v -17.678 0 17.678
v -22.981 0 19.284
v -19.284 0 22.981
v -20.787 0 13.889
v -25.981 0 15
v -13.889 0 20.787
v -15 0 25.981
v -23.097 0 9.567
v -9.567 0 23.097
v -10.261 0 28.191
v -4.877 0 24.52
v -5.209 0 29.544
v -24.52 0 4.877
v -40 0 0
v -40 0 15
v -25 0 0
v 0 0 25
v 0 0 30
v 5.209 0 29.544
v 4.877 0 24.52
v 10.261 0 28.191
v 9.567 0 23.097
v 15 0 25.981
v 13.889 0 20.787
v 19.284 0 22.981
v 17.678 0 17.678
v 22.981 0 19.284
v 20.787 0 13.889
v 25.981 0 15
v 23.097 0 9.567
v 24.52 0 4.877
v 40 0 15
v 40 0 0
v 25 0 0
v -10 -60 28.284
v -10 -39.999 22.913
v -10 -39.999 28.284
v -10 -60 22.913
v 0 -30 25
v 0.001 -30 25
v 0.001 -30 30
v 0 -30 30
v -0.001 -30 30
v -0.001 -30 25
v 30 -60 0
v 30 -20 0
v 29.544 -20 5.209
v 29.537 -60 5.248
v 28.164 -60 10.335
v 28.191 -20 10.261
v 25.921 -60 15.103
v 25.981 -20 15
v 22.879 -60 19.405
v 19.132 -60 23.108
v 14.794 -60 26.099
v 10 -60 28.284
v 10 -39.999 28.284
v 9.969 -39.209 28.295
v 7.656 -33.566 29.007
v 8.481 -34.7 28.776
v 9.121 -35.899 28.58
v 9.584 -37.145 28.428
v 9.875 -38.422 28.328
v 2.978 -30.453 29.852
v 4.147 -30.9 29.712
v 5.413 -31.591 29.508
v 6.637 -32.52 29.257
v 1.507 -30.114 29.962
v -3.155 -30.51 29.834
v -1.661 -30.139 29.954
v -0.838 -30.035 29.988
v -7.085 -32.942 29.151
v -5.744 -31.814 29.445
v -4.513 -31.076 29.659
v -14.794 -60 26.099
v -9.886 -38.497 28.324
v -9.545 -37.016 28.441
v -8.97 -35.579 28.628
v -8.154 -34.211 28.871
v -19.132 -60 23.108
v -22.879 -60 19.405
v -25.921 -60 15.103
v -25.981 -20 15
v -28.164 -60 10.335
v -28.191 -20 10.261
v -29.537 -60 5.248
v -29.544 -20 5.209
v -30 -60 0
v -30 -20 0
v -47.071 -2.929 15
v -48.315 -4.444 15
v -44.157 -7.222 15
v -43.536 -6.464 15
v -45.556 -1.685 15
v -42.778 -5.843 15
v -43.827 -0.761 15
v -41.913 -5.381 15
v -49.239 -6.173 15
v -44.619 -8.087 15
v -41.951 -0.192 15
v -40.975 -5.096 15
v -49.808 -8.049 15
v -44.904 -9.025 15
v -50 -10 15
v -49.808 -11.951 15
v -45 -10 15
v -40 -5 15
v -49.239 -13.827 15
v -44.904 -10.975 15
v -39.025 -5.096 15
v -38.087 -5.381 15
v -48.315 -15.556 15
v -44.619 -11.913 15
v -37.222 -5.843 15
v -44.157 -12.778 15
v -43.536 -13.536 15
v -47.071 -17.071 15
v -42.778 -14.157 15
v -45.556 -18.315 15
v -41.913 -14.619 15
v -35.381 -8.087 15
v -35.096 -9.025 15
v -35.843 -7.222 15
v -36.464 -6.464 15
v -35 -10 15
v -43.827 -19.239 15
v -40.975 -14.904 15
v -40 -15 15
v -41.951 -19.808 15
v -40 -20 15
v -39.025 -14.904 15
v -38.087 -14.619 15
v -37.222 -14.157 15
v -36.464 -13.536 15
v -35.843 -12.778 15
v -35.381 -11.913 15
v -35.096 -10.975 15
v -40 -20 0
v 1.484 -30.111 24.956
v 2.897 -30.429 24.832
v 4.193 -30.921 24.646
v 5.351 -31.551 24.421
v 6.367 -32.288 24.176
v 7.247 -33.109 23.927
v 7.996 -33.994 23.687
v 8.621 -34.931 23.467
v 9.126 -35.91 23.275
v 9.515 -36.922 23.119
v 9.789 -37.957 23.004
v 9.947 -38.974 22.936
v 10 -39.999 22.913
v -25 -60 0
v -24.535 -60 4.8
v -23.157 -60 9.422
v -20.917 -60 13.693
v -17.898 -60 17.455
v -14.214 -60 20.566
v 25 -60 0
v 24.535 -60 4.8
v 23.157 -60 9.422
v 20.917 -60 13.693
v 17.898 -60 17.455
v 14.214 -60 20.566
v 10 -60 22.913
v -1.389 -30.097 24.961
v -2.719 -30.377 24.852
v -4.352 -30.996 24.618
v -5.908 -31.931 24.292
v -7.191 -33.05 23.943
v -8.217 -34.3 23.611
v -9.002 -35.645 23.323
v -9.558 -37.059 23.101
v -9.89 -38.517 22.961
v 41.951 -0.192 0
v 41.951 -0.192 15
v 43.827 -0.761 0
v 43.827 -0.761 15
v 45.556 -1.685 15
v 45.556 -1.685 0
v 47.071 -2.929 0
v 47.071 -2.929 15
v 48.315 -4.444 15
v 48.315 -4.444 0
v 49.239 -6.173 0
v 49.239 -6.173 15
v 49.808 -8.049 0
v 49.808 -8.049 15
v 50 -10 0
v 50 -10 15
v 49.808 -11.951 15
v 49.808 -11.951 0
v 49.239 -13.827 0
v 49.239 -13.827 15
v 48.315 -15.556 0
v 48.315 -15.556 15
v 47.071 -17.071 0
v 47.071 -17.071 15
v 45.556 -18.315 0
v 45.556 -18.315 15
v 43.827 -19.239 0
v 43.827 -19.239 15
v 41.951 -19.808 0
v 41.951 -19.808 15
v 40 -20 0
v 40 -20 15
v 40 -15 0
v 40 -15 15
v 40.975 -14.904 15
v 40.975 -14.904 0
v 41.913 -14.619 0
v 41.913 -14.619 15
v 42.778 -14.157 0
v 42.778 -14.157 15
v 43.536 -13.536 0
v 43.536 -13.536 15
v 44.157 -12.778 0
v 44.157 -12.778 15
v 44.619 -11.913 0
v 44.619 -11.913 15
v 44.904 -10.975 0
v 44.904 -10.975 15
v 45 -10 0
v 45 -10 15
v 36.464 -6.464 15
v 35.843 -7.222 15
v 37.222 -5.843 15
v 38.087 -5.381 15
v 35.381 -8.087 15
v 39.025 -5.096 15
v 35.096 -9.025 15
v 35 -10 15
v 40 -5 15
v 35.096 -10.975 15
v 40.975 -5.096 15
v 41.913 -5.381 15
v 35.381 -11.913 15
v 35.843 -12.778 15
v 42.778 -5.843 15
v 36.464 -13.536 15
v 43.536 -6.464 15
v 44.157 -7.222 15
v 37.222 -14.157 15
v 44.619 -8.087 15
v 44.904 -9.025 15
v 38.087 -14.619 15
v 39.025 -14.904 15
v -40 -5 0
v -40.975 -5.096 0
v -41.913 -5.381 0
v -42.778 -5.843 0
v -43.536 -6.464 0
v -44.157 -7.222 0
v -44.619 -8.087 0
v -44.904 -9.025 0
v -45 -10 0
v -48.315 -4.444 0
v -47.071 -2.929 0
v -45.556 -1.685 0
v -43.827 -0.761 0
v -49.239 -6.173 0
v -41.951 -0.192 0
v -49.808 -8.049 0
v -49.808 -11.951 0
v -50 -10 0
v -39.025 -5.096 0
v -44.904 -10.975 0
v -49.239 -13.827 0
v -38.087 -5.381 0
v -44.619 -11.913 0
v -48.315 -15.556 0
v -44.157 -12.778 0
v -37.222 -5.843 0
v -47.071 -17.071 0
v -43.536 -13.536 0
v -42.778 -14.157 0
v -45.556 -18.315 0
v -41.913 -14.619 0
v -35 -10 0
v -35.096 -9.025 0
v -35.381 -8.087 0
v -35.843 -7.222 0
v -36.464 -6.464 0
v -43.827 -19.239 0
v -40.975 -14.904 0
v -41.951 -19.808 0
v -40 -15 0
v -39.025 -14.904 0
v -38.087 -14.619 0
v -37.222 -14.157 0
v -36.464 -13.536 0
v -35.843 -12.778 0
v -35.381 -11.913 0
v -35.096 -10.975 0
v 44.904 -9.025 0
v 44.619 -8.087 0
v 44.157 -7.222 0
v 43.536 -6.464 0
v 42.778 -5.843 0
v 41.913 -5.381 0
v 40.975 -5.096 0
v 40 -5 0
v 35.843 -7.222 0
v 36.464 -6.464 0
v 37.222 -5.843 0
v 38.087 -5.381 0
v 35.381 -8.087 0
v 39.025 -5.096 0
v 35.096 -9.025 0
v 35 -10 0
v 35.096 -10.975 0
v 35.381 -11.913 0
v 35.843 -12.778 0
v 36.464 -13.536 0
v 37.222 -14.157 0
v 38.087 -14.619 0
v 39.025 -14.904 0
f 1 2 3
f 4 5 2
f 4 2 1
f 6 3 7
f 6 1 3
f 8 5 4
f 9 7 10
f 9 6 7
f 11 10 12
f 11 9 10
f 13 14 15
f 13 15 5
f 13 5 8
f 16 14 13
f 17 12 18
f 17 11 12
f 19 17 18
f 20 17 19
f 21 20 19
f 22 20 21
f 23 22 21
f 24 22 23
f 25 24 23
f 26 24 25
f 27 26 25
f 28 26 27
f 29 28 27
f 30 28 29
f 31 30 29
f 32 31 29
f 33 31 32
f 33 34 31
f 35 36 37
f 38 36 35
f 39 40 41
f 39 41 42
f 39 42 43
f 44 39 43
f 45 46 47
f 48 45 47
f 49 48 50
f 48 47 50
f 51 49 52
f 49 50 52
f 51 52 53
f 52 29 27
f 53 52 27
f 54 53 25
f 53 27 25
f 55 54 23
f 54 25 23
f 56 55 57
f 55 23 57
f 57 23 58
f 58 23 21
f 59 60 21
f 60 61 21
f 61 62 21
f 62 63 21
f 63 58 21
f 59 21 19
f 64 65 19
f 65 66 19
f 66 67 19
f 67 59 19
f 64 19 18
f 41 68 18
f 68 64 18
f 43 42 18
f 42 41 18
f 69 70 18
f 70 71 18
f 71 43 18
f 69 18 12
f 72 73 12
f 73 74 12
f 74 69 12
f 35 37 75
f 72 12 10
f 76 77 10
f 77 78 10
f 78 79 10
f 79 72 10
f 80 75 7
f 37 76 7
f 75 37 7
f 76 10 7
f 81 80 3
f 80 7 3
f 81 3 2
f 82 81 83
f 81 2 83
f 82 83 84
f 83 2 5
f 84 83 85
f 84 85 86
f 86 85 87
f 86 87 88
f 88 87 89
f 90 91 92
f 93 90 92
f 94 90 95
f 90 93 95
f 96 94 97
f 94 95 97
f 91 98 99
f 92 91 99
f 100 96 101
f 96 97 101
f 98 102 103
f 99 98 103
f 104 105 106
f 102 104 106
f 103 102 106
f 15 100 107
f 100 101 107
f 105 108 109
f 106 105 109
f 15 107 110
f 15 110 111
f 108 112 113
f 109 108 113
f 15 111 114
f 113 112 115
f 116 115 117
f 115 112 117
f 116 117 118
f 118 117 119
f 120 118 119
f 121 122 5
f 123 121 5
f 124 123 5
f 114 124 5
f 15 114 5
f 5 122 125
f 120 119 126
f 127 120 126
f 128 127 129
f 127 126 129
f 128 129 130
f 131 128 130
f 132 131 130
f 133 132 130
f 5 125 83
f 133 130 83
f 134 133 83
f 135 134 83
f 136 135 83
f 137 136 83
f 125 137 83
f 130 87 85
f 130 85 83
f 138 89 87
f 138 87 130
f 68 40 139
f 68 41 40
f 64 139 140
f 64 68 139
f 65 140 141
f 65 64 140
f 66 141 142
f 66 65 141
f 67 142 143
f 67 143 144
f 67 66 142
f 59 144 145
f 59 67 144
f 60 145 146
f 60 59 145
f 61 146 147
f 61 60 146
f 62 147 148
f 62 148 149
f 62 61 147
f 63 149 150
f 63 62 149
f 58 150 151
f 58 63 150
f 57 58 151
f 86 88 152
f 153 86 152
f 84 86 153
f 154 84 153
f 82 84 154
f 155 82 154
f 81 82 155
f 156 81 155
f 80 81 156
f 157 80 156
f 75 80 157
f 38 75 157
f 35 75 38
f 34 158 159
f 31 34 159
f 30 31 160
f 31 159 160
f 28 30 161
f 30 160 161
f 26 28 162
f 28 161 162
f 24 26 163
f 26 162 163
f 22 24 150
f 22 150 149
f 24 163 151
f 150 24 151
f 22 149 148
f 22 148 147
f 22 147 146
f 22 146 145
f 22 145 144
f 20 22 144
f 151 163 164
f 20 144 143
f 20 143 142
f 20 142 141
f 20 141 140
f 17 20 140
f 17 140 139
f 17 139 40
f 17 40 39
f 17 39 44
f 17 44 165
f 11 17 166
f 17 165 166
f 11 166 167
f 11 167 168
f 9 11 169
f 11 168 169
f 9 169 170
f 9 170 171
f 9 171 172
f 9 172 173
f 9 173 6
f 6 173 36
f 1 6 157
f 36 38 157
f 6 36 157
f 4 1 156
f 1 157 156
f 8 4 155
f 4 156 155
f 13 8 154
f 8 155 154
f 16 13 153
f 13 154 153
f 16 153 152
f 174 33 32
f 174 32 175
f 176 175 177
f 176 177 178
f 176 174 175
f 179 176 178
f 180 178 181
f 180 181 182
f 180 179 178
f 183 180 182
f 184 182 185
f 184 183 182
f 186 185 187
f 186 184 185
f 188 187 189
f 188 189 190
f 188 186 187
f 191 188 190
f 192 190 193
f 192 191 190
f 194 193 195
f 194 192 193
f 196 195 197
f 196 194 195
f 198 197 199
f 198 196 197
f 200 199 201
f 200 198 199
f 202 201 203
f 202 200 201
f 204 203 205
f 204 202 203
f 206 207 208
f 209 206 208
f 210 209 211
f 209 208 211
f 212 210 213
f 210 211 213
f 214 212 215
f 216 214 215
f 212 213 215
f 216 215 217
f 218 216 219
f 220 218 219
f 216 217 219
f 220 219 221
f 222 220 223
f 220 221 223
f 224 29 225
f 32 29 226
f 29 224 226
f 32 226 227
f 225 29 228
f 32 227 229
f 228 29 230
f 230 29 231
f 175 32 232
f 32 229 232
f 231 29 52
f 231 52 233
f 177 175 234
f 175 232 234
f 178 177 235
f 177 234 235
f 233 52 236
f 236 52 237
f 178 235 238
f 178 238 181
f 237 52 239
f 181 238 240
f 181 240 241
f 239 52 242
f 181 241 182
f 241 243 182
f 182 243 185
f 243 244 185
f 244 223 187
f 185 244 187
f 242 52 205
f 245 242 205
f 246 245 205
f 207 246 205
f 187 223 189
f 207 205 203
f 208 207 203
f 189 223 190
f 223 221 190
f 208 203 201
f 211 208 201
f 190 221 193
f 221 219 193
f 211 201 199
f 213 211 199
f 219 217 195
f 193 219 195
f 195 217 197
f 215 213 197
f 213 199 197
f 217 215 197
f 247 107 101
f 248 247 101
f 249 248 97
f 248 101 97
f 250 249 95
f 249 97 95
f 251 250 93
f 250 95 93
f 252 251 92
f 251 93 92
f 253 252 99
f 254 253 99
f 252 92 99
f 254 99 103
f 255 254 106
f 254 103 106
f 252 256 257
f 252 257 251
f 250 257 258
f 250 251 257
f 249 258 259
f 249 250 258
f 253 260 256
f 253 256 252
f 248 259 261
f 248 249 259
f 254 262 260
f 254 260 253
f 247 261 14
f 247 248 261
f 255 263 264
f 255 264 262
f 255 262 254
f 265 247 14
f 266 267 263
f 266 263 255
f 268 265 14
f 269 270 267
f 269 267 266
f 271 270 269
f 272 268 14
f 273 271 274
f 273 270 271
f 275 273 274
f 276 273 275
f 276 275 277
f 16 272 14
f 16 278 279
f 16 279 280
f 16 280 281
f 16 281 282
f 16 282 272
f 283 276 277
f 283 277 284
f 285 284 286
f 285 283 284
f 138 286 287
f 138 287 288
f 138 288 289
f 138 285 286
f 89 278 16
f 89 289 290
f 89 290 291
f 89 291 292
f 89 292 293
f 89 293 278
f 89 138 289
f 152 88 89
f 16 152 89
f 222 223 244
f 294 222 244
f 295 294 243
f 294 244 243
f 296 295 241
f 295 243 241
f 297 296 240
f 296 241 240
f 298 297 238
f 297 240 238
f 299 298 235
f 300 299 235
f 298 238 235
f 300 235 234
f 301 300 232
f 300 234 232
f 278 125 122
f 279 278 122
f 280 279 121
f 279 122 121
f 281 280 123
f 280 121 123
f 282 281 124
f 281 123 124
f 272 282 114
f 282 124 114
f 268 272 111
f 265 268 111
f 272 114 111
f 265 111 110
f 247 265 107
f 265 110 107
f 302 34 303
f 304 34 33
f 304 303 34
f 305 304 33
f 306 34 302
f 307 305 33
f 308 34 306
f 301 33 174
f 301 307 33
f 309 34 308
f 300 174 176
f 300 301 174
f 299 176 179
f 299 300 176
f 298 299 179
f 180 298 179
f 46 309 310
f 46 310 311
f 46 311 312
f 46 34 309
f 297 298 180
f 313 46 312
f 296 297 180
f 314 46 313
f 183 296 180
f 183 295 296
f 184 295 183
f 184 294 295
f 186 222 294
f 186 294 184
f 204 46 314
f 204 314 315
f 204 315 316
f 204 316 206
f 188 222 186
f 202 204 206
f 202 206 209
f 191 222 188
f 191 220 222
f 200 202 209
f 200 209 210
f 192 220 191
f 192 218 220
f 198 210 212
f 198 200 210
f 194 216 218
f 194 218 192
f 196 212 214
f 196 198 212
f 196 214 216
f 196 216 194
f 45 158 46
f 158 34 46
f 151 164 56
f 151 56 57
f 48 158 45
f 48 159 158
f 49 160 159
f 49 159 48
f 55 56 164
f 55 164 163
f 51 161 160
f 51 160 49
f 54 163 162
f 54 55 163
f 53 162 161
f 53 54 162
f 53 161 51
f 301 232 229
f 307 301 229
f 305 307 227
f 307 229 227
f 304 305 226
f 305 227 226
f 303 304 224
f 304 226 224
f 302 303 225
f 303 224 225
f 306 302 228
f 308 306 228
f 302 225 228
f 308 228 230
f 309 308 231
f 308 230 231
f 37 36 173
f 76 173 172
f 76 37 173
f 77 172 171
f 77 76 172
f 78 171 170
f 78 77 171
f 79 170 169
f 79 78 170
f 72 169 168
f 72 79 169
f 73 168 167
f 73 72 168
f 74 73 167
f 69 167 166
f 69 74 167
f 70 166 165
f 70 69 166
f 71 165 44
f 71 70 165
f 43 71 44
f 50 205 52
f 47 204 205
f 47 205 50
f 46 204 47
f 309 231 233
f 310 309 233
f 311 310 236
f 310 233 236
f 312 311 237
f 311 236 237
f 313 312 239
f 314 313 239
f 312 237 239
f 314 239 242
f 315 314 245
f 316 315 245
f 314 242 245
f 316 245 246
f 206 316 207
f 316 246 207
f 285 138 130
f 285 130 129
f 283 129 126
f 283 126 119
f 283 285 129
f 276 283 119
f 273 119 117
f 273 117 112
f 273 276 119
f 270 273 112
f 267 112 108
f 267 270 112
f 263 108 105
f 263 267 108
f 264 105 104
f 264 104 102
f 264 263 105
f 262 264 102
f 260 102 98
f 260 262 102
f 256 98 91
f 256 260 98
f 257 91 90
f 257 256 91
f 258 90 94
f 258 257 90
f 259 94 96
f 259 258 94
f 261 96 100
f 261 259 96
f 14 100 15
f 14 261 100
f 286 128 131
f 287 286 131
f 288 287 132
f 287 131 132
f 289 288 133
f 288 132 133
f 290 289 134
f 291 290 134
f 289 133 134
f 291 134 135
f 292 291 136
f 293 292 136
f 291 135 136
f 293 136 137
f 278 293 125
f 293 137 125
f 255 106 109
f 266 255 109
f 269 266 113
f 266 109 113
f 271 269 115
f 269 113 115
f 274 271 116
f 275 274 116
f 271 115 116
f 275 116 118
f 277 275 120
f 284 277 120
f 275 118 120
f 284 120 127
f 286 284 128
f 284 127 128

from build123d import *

# Parameters (mm, degrees)
F1_DEPTH  = 60
F3_DEPTH  = 15
F5_DEPTH  = 15.001
F7_DEPTH  = 15.001
F9_DEPTH  = 60.001
F11_REACH = 66.0565127546
F12_R     = 9.999


# Not quite as in the source:
# - a fillet or chamfer is up to 0.001 mm smaller than in the source, because OpenCascade refuses the exact size


with BuildPart() as f1:
    # F0 (on Front) → F1 (new body)
    with BuildSketch(Plane.XZ):
        with BuildLine():
            Line((-30, 0), (30, 0))
            ThreePointArc((30, 0), (0, 30), (-30, 0))
        make_face()
    extrude(amount=F1_DEPTH)

    # F2 (on face) → F3 (join)
    with BuildSketch(Plane(origin=(0, 0, 0), x_dir=(1, 0, 0), z_dir=(0, 0, -1))):
        with BuildLine():
            ThreePointArc((-40, 20), (-50, 10), (-40, 0))
            Line((-40, 0), (40, 0))
            ThreePointArc((40, 0), (50, 10), (40, 20))
            Line((40, 20), (-40, 20))
        make_face()
    extrude(amount=-F3_DEPTH)

    # F4 (on face) → F5 (cut, through all)
    with BuildSketch(Plane.XY.offset(15)):
        with BuildLine():
            Line((-45, -10), (-40, -10))
            Line((-40, -10), (-40, -5))
            ThreePointArc((-40, -5), (-43.5355339059, -6.4644660941), (-45, -10))
        make_face()
        with BuildLine():
            Line((-40, -5), (-40, -10))
            Line((-40, -10), (-35, -10))
            ThreePointArc((-35, -10), (-36.4644660941, -6.4644660941), (-40, -5))
        make_face()
        with BuildLine():
            Line((-40, -10), (-40, -15))
            ThreePointArc((-40, -15), (-36.4644660941, -13.5355339059), (-35, -10))
            Line((-35, -10), (-40, -10))
        make_face()
        with BuildLine():
            ThreePointArc((-45, -10), (-43.5355339059, -13.5355339059), (-40, -15))
            Line((-40, -15), (-40, -10))
            Line((-40, -10), (-45, -10))
        make_face()
    extrude(amount=-F5_DEPTH, mode=Mode.SUBTRACT)

    # F6 (on face) → F7 (cut, through all)
    with BuildSketch(Plane.XY.offset(15)):
        with BuildLine():
            ThreePointArc((40, -5), (36.4644660941, -6.4644660941), (35, -10))
            Line((35, -10), (40, -10))
            Line((40, -10), (40, -5))
        make_face()
        with BuildLine():
            Line((40, -5), (40, -10))
            Line((40, -10), (45, -10))
            ThreePointArc((45, -10), (43.5355339059, -6.4644660941), (40, -5))
        make_face()
        with BuildLine():
            Line((45, -10), (40, -10))
            Line((40, -10), (40, -15))
            ThreePointArc((40, -15), (43.5355339059, -13.5355339059), (45, -10))
        make_face()
        with BuildLine():
            Line((40, -10), (35, -10))
            ThreePointArc((35, -10), (36.4644660941, -13.5355339059), (40, -15))
            Line((40, -15), (40, -10))
        make_face()
    extrude(amount=-F7_DEPTH, mode=Mode.SUBTRACT)

    # F8 (on face) → F9 (cut, through all)
    with BuildSketch(Plane.XZ.offset(60)):
        with BuildLine():
            Line((-25, 0), (25, 0))
            ThreePointArc((25, 0), (0, 25), (-25, 0))
        make_face()
    extrude(amount=-F9_DEPTH, mode=Mode.SUBTRACT)

    f11_end = f1.faces().sort_by_distance((0, -30, 30))[0]
    # F10 (on Top) → F11 (cut, up to a face of the model that its end follows)
    with BuildSketch(Plane.XY):
        Polygon((-10, -60), (0, -60), (10, -60), (10, -30), (-10, -30), align=None)
    f11_long = extrude(amount=F11_REACH, mode=Mode.PRIVATE)
    add(split(f11_long, bisect_by=f11_end, keep=Keep.BOTTOM, mode=Mode.PRIVATE), mode=Mode.SUBTRACT)

    # F12 (radius 10 in the source; OpenCascade refuses exactly that, so slightly less here)
    f12_edges = [f1.edges().sort_by_distance(p)[0] for p in [
        (-10, -30, 25.598575),
        (10, -30, 25.598575),
    ]]
    fillet(f12_edges, radius=F12_R)


solid = f1.part
